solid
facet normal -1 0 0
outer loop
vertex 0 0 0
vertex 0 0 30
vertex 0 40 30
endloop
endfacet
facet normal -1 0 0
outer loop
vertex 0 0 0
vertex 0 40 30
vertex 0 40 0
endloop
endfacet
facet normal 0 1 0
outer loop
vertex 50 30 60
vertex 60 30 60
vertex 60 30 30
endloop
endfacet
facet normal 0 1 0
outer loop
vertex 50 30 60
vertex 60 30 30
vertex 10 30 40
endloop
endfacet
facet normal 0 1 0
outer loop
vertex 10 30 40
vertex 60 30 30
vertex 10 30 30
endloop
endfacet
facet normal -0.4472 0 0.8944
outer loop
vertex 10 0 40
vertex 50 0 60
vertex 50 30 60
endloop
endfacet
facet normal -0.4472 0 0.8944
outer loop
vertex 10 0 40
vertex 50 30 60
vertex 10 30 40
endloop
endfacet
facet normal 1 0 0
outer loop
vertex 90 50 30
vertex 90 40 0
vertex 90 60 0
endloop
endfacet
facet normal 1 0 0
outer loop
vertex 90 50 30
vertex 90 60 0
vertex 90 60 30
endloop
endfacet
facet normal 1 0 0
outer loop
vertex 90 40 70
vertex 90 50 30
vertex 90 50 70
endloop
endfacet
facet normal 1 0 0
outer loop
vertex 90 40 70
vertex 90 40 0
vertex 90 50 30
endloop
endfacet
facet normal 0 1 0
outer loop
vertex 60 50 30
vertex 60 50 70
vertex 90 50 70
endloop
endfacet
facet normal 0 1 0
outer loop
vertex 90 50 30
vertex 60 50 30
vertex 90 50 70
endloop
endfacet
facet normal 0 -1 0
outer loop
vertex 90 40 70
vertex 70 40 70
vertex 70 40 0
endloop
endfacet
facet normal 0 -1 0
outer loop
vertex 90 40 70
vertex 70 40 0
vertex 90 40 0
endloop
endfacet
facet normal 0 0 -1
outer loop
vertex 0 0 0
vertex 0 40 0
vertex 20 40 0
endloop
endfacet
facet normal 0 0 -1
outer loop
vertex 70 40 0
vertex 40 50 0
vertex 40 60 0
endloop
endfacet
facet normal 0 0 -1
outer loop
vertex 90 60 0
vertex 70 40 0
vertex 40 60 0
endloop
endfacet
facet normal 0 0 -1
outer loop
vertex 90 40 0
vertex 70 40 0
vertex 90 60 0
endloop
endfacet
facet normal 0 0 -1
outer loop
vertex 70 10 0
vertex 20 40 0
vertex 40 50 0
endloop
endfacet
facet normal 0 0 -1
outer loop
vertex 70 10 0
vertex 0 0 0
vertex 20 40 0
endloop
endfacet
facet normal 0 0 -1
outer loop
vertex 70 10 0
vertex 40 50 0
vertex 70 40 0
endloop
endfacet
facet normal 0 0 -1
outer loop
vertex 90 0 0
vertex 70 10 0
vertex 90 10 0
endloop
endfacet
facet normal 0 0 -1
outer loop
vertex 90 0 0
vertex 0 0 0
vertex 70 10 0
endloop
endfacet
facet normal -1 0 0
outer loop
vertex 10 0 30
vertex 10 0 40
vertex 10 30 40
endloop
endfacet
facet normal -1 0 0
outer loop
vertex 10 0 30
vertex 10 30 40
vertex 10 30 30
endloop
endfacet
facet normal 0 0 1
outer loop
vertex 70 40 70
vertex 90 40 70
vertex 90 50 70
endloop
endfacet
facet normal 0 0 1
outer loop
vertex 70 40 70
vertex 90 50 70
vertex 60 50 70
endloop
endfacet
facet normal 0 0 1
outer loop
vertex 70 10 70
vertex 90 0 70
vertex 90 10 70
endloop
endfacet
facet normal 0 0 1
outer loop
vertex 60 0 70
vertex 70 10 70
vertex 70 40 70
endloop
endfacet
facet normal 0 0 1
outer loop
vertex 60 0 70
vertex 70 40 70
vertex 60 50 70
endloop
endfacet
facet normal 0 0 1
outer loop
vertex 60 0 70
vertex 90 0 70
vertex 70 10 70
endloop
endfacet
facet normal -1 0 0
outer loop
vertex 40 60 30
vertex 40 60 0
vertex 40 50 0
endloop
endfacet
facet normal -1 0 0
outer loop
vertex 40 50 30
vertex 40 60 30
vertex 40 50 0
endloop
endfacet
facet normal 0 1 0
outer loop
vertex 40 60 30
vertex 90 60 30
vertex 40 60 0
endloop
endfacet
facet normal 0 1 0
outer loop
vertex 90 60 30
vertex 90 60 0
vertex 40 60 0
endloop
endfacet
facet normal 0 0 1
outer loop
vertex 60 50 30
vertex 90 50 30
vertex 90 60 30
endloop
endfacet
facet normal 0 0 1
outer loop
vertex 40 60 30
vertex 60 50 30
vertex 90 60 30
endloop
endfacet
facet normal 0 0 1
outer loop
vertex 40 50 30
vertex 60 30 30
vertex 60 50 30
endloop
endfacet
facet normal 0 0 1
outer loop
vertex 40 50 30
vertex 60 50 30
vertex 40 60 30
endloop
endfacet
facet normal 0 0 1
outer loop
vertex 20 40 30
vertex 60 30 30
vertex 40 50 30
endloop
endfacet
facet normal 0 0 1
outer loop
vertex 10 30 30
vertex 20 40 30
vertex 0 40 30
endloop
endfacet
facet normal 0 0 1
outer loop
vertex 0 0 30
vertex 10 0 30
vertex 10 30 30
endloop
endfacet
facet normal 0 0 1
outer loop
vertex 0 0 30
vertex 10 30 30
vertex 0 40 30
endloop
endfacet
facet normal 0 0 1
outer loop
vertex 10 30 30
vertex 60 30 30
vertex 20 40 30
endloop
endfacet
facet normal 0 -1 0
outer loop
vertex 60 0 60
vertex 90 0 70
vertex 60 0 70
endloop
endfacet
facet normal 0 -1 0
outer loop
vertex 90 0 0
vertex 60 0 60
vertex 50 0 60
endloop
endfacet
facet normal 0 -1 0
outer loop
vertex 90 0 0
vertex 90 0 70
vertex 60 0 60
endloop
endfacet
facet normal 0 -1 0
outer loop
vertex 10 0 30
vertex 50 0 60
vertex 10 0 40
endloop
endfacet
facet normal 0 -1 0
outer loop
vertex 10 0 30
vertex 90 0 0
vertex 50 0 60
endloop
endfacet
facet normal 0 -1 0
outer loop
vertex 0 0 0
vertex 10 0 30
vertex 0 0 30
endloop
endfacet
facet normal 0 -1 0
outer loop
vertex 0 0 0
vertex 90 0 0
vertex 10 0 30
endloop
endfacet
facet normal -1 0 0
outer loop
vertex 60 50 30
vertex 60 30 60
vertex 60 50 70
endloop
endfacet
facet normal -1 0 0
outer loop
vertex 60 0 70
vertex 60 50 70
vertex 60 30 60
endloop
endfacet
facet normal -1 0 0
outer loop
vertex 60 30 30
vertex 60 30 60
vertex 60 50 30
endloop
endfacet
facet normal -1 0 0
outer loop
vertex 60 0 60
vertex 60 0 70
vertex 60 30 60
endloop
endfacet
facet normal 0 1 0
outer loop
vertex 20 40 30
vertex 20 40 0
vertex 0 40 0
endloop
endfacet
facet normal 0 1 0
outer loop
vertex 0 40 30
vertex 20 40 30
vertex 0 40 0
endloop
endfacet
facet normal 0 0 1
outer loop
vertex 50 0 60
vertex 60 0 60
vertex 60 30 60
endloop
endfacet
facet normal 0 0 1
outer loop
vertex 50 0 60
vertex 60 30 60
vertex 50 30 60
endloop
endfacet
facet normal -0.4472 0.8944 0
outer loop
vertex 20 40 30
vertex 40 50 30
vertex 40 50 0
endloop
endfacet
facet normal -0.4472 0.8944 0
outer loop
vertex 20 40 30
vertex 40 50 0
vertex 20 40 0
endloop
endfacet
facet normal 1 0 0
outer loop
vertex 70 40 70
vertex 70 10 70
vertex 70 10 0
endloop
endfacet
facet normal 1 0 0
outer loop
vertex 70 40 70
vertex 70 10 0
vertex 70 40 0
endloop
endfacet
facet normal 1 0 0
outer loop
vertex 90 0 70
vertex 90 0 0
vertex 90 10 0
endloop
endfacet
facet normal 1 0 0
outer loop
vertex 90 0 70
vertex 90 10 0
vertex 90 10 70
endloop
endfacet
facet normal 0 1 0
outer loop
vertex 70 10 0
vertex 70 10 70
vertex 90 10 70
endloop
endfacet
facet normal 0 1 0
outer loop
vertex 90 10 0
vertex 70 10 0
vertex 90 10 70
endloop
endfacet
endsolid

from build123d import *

# Parameters (mm, degrees)
BOSS_EXTRUDE1_DEPTH = 30
BOSS_EXTRUDE2_DEPTH = 30
SKETCH5_W           = 20
SKETCH5_H           = 30
CUT_EXTRUDE1_DEPTH  = 71
SKETCH6_W           = 30
SKETCH6_H           = 10
CUT_EXTRUDE2_DEPTH  = 40
CUT_EXTRUDE3_DEPTH  = 71


with BuildPart() as part:
    # Sketch1 → Boss-Extrude1 (new body)
    with BuildSketch(Plane(origin=(0, 0, 0), x_dir=(1, 0, 0), z_dir=(0, 1, 0))):
        Polygon((0, 0), (90, 0), (90, -70), (60, -70), (60, -60), (50, -60), (10, -40), (10, -30), (0, -30), align=None)
    extrude(amount=BOSS_EXTRUDE1_DEPTH)

    # Sketch3 → Boss-Extrude2 (add)
    with BuildSketch(Plane(origin=(0, 30, 0), x_dir=(1, 0, 0), z_dir=(0, 1, 0))):
        Polygon((0, 0), (90, 0), (90, -70), (60, -70), (60, -30), (0, -30), align=None)
    extrude(amount=BOSS_EXTRUDE2_DEPTH)

    # Sketch5 → Cut-Extrude1 (cut, through all)
    with BuildSketch(Plane.XY.offset(70)):
        with Locations((80, 25)):
            Rectangle(SKETCH5_W, SKETCH5_H)
    extrude(amount=-CUT_EXTRUDE1_DEPTH, mode=Mode.SUBTRACT)

    # Sketch6 → Cut-Extrude2 (cut)
    with BuildSketch(Plane.XY.offset(70)):
        with Locations((75, 55)):
            Rectangle(SKETCH6_W, SKETCH6_H)
    extrude(amount=-CUT_EXTRUDE2_DEPTH, mode=Mode.SUBTRACT)

    # Sketch7 → Cut-Extrude3 (cut, through all)
    with BuildSketch(Plane(origin=(0, 0, 0), x_dir=(-1, 0, 0), z_dir=(0, 0, -1))):
        Polygon((-40, 60), (-40, 50), (-20, 40), (0, 40), (0, 60), align=None)
    extrude(amount=-CUT_EXTRUDE3_DEPTH, mode=Mode.SUBTRACT)


solid = part.part
